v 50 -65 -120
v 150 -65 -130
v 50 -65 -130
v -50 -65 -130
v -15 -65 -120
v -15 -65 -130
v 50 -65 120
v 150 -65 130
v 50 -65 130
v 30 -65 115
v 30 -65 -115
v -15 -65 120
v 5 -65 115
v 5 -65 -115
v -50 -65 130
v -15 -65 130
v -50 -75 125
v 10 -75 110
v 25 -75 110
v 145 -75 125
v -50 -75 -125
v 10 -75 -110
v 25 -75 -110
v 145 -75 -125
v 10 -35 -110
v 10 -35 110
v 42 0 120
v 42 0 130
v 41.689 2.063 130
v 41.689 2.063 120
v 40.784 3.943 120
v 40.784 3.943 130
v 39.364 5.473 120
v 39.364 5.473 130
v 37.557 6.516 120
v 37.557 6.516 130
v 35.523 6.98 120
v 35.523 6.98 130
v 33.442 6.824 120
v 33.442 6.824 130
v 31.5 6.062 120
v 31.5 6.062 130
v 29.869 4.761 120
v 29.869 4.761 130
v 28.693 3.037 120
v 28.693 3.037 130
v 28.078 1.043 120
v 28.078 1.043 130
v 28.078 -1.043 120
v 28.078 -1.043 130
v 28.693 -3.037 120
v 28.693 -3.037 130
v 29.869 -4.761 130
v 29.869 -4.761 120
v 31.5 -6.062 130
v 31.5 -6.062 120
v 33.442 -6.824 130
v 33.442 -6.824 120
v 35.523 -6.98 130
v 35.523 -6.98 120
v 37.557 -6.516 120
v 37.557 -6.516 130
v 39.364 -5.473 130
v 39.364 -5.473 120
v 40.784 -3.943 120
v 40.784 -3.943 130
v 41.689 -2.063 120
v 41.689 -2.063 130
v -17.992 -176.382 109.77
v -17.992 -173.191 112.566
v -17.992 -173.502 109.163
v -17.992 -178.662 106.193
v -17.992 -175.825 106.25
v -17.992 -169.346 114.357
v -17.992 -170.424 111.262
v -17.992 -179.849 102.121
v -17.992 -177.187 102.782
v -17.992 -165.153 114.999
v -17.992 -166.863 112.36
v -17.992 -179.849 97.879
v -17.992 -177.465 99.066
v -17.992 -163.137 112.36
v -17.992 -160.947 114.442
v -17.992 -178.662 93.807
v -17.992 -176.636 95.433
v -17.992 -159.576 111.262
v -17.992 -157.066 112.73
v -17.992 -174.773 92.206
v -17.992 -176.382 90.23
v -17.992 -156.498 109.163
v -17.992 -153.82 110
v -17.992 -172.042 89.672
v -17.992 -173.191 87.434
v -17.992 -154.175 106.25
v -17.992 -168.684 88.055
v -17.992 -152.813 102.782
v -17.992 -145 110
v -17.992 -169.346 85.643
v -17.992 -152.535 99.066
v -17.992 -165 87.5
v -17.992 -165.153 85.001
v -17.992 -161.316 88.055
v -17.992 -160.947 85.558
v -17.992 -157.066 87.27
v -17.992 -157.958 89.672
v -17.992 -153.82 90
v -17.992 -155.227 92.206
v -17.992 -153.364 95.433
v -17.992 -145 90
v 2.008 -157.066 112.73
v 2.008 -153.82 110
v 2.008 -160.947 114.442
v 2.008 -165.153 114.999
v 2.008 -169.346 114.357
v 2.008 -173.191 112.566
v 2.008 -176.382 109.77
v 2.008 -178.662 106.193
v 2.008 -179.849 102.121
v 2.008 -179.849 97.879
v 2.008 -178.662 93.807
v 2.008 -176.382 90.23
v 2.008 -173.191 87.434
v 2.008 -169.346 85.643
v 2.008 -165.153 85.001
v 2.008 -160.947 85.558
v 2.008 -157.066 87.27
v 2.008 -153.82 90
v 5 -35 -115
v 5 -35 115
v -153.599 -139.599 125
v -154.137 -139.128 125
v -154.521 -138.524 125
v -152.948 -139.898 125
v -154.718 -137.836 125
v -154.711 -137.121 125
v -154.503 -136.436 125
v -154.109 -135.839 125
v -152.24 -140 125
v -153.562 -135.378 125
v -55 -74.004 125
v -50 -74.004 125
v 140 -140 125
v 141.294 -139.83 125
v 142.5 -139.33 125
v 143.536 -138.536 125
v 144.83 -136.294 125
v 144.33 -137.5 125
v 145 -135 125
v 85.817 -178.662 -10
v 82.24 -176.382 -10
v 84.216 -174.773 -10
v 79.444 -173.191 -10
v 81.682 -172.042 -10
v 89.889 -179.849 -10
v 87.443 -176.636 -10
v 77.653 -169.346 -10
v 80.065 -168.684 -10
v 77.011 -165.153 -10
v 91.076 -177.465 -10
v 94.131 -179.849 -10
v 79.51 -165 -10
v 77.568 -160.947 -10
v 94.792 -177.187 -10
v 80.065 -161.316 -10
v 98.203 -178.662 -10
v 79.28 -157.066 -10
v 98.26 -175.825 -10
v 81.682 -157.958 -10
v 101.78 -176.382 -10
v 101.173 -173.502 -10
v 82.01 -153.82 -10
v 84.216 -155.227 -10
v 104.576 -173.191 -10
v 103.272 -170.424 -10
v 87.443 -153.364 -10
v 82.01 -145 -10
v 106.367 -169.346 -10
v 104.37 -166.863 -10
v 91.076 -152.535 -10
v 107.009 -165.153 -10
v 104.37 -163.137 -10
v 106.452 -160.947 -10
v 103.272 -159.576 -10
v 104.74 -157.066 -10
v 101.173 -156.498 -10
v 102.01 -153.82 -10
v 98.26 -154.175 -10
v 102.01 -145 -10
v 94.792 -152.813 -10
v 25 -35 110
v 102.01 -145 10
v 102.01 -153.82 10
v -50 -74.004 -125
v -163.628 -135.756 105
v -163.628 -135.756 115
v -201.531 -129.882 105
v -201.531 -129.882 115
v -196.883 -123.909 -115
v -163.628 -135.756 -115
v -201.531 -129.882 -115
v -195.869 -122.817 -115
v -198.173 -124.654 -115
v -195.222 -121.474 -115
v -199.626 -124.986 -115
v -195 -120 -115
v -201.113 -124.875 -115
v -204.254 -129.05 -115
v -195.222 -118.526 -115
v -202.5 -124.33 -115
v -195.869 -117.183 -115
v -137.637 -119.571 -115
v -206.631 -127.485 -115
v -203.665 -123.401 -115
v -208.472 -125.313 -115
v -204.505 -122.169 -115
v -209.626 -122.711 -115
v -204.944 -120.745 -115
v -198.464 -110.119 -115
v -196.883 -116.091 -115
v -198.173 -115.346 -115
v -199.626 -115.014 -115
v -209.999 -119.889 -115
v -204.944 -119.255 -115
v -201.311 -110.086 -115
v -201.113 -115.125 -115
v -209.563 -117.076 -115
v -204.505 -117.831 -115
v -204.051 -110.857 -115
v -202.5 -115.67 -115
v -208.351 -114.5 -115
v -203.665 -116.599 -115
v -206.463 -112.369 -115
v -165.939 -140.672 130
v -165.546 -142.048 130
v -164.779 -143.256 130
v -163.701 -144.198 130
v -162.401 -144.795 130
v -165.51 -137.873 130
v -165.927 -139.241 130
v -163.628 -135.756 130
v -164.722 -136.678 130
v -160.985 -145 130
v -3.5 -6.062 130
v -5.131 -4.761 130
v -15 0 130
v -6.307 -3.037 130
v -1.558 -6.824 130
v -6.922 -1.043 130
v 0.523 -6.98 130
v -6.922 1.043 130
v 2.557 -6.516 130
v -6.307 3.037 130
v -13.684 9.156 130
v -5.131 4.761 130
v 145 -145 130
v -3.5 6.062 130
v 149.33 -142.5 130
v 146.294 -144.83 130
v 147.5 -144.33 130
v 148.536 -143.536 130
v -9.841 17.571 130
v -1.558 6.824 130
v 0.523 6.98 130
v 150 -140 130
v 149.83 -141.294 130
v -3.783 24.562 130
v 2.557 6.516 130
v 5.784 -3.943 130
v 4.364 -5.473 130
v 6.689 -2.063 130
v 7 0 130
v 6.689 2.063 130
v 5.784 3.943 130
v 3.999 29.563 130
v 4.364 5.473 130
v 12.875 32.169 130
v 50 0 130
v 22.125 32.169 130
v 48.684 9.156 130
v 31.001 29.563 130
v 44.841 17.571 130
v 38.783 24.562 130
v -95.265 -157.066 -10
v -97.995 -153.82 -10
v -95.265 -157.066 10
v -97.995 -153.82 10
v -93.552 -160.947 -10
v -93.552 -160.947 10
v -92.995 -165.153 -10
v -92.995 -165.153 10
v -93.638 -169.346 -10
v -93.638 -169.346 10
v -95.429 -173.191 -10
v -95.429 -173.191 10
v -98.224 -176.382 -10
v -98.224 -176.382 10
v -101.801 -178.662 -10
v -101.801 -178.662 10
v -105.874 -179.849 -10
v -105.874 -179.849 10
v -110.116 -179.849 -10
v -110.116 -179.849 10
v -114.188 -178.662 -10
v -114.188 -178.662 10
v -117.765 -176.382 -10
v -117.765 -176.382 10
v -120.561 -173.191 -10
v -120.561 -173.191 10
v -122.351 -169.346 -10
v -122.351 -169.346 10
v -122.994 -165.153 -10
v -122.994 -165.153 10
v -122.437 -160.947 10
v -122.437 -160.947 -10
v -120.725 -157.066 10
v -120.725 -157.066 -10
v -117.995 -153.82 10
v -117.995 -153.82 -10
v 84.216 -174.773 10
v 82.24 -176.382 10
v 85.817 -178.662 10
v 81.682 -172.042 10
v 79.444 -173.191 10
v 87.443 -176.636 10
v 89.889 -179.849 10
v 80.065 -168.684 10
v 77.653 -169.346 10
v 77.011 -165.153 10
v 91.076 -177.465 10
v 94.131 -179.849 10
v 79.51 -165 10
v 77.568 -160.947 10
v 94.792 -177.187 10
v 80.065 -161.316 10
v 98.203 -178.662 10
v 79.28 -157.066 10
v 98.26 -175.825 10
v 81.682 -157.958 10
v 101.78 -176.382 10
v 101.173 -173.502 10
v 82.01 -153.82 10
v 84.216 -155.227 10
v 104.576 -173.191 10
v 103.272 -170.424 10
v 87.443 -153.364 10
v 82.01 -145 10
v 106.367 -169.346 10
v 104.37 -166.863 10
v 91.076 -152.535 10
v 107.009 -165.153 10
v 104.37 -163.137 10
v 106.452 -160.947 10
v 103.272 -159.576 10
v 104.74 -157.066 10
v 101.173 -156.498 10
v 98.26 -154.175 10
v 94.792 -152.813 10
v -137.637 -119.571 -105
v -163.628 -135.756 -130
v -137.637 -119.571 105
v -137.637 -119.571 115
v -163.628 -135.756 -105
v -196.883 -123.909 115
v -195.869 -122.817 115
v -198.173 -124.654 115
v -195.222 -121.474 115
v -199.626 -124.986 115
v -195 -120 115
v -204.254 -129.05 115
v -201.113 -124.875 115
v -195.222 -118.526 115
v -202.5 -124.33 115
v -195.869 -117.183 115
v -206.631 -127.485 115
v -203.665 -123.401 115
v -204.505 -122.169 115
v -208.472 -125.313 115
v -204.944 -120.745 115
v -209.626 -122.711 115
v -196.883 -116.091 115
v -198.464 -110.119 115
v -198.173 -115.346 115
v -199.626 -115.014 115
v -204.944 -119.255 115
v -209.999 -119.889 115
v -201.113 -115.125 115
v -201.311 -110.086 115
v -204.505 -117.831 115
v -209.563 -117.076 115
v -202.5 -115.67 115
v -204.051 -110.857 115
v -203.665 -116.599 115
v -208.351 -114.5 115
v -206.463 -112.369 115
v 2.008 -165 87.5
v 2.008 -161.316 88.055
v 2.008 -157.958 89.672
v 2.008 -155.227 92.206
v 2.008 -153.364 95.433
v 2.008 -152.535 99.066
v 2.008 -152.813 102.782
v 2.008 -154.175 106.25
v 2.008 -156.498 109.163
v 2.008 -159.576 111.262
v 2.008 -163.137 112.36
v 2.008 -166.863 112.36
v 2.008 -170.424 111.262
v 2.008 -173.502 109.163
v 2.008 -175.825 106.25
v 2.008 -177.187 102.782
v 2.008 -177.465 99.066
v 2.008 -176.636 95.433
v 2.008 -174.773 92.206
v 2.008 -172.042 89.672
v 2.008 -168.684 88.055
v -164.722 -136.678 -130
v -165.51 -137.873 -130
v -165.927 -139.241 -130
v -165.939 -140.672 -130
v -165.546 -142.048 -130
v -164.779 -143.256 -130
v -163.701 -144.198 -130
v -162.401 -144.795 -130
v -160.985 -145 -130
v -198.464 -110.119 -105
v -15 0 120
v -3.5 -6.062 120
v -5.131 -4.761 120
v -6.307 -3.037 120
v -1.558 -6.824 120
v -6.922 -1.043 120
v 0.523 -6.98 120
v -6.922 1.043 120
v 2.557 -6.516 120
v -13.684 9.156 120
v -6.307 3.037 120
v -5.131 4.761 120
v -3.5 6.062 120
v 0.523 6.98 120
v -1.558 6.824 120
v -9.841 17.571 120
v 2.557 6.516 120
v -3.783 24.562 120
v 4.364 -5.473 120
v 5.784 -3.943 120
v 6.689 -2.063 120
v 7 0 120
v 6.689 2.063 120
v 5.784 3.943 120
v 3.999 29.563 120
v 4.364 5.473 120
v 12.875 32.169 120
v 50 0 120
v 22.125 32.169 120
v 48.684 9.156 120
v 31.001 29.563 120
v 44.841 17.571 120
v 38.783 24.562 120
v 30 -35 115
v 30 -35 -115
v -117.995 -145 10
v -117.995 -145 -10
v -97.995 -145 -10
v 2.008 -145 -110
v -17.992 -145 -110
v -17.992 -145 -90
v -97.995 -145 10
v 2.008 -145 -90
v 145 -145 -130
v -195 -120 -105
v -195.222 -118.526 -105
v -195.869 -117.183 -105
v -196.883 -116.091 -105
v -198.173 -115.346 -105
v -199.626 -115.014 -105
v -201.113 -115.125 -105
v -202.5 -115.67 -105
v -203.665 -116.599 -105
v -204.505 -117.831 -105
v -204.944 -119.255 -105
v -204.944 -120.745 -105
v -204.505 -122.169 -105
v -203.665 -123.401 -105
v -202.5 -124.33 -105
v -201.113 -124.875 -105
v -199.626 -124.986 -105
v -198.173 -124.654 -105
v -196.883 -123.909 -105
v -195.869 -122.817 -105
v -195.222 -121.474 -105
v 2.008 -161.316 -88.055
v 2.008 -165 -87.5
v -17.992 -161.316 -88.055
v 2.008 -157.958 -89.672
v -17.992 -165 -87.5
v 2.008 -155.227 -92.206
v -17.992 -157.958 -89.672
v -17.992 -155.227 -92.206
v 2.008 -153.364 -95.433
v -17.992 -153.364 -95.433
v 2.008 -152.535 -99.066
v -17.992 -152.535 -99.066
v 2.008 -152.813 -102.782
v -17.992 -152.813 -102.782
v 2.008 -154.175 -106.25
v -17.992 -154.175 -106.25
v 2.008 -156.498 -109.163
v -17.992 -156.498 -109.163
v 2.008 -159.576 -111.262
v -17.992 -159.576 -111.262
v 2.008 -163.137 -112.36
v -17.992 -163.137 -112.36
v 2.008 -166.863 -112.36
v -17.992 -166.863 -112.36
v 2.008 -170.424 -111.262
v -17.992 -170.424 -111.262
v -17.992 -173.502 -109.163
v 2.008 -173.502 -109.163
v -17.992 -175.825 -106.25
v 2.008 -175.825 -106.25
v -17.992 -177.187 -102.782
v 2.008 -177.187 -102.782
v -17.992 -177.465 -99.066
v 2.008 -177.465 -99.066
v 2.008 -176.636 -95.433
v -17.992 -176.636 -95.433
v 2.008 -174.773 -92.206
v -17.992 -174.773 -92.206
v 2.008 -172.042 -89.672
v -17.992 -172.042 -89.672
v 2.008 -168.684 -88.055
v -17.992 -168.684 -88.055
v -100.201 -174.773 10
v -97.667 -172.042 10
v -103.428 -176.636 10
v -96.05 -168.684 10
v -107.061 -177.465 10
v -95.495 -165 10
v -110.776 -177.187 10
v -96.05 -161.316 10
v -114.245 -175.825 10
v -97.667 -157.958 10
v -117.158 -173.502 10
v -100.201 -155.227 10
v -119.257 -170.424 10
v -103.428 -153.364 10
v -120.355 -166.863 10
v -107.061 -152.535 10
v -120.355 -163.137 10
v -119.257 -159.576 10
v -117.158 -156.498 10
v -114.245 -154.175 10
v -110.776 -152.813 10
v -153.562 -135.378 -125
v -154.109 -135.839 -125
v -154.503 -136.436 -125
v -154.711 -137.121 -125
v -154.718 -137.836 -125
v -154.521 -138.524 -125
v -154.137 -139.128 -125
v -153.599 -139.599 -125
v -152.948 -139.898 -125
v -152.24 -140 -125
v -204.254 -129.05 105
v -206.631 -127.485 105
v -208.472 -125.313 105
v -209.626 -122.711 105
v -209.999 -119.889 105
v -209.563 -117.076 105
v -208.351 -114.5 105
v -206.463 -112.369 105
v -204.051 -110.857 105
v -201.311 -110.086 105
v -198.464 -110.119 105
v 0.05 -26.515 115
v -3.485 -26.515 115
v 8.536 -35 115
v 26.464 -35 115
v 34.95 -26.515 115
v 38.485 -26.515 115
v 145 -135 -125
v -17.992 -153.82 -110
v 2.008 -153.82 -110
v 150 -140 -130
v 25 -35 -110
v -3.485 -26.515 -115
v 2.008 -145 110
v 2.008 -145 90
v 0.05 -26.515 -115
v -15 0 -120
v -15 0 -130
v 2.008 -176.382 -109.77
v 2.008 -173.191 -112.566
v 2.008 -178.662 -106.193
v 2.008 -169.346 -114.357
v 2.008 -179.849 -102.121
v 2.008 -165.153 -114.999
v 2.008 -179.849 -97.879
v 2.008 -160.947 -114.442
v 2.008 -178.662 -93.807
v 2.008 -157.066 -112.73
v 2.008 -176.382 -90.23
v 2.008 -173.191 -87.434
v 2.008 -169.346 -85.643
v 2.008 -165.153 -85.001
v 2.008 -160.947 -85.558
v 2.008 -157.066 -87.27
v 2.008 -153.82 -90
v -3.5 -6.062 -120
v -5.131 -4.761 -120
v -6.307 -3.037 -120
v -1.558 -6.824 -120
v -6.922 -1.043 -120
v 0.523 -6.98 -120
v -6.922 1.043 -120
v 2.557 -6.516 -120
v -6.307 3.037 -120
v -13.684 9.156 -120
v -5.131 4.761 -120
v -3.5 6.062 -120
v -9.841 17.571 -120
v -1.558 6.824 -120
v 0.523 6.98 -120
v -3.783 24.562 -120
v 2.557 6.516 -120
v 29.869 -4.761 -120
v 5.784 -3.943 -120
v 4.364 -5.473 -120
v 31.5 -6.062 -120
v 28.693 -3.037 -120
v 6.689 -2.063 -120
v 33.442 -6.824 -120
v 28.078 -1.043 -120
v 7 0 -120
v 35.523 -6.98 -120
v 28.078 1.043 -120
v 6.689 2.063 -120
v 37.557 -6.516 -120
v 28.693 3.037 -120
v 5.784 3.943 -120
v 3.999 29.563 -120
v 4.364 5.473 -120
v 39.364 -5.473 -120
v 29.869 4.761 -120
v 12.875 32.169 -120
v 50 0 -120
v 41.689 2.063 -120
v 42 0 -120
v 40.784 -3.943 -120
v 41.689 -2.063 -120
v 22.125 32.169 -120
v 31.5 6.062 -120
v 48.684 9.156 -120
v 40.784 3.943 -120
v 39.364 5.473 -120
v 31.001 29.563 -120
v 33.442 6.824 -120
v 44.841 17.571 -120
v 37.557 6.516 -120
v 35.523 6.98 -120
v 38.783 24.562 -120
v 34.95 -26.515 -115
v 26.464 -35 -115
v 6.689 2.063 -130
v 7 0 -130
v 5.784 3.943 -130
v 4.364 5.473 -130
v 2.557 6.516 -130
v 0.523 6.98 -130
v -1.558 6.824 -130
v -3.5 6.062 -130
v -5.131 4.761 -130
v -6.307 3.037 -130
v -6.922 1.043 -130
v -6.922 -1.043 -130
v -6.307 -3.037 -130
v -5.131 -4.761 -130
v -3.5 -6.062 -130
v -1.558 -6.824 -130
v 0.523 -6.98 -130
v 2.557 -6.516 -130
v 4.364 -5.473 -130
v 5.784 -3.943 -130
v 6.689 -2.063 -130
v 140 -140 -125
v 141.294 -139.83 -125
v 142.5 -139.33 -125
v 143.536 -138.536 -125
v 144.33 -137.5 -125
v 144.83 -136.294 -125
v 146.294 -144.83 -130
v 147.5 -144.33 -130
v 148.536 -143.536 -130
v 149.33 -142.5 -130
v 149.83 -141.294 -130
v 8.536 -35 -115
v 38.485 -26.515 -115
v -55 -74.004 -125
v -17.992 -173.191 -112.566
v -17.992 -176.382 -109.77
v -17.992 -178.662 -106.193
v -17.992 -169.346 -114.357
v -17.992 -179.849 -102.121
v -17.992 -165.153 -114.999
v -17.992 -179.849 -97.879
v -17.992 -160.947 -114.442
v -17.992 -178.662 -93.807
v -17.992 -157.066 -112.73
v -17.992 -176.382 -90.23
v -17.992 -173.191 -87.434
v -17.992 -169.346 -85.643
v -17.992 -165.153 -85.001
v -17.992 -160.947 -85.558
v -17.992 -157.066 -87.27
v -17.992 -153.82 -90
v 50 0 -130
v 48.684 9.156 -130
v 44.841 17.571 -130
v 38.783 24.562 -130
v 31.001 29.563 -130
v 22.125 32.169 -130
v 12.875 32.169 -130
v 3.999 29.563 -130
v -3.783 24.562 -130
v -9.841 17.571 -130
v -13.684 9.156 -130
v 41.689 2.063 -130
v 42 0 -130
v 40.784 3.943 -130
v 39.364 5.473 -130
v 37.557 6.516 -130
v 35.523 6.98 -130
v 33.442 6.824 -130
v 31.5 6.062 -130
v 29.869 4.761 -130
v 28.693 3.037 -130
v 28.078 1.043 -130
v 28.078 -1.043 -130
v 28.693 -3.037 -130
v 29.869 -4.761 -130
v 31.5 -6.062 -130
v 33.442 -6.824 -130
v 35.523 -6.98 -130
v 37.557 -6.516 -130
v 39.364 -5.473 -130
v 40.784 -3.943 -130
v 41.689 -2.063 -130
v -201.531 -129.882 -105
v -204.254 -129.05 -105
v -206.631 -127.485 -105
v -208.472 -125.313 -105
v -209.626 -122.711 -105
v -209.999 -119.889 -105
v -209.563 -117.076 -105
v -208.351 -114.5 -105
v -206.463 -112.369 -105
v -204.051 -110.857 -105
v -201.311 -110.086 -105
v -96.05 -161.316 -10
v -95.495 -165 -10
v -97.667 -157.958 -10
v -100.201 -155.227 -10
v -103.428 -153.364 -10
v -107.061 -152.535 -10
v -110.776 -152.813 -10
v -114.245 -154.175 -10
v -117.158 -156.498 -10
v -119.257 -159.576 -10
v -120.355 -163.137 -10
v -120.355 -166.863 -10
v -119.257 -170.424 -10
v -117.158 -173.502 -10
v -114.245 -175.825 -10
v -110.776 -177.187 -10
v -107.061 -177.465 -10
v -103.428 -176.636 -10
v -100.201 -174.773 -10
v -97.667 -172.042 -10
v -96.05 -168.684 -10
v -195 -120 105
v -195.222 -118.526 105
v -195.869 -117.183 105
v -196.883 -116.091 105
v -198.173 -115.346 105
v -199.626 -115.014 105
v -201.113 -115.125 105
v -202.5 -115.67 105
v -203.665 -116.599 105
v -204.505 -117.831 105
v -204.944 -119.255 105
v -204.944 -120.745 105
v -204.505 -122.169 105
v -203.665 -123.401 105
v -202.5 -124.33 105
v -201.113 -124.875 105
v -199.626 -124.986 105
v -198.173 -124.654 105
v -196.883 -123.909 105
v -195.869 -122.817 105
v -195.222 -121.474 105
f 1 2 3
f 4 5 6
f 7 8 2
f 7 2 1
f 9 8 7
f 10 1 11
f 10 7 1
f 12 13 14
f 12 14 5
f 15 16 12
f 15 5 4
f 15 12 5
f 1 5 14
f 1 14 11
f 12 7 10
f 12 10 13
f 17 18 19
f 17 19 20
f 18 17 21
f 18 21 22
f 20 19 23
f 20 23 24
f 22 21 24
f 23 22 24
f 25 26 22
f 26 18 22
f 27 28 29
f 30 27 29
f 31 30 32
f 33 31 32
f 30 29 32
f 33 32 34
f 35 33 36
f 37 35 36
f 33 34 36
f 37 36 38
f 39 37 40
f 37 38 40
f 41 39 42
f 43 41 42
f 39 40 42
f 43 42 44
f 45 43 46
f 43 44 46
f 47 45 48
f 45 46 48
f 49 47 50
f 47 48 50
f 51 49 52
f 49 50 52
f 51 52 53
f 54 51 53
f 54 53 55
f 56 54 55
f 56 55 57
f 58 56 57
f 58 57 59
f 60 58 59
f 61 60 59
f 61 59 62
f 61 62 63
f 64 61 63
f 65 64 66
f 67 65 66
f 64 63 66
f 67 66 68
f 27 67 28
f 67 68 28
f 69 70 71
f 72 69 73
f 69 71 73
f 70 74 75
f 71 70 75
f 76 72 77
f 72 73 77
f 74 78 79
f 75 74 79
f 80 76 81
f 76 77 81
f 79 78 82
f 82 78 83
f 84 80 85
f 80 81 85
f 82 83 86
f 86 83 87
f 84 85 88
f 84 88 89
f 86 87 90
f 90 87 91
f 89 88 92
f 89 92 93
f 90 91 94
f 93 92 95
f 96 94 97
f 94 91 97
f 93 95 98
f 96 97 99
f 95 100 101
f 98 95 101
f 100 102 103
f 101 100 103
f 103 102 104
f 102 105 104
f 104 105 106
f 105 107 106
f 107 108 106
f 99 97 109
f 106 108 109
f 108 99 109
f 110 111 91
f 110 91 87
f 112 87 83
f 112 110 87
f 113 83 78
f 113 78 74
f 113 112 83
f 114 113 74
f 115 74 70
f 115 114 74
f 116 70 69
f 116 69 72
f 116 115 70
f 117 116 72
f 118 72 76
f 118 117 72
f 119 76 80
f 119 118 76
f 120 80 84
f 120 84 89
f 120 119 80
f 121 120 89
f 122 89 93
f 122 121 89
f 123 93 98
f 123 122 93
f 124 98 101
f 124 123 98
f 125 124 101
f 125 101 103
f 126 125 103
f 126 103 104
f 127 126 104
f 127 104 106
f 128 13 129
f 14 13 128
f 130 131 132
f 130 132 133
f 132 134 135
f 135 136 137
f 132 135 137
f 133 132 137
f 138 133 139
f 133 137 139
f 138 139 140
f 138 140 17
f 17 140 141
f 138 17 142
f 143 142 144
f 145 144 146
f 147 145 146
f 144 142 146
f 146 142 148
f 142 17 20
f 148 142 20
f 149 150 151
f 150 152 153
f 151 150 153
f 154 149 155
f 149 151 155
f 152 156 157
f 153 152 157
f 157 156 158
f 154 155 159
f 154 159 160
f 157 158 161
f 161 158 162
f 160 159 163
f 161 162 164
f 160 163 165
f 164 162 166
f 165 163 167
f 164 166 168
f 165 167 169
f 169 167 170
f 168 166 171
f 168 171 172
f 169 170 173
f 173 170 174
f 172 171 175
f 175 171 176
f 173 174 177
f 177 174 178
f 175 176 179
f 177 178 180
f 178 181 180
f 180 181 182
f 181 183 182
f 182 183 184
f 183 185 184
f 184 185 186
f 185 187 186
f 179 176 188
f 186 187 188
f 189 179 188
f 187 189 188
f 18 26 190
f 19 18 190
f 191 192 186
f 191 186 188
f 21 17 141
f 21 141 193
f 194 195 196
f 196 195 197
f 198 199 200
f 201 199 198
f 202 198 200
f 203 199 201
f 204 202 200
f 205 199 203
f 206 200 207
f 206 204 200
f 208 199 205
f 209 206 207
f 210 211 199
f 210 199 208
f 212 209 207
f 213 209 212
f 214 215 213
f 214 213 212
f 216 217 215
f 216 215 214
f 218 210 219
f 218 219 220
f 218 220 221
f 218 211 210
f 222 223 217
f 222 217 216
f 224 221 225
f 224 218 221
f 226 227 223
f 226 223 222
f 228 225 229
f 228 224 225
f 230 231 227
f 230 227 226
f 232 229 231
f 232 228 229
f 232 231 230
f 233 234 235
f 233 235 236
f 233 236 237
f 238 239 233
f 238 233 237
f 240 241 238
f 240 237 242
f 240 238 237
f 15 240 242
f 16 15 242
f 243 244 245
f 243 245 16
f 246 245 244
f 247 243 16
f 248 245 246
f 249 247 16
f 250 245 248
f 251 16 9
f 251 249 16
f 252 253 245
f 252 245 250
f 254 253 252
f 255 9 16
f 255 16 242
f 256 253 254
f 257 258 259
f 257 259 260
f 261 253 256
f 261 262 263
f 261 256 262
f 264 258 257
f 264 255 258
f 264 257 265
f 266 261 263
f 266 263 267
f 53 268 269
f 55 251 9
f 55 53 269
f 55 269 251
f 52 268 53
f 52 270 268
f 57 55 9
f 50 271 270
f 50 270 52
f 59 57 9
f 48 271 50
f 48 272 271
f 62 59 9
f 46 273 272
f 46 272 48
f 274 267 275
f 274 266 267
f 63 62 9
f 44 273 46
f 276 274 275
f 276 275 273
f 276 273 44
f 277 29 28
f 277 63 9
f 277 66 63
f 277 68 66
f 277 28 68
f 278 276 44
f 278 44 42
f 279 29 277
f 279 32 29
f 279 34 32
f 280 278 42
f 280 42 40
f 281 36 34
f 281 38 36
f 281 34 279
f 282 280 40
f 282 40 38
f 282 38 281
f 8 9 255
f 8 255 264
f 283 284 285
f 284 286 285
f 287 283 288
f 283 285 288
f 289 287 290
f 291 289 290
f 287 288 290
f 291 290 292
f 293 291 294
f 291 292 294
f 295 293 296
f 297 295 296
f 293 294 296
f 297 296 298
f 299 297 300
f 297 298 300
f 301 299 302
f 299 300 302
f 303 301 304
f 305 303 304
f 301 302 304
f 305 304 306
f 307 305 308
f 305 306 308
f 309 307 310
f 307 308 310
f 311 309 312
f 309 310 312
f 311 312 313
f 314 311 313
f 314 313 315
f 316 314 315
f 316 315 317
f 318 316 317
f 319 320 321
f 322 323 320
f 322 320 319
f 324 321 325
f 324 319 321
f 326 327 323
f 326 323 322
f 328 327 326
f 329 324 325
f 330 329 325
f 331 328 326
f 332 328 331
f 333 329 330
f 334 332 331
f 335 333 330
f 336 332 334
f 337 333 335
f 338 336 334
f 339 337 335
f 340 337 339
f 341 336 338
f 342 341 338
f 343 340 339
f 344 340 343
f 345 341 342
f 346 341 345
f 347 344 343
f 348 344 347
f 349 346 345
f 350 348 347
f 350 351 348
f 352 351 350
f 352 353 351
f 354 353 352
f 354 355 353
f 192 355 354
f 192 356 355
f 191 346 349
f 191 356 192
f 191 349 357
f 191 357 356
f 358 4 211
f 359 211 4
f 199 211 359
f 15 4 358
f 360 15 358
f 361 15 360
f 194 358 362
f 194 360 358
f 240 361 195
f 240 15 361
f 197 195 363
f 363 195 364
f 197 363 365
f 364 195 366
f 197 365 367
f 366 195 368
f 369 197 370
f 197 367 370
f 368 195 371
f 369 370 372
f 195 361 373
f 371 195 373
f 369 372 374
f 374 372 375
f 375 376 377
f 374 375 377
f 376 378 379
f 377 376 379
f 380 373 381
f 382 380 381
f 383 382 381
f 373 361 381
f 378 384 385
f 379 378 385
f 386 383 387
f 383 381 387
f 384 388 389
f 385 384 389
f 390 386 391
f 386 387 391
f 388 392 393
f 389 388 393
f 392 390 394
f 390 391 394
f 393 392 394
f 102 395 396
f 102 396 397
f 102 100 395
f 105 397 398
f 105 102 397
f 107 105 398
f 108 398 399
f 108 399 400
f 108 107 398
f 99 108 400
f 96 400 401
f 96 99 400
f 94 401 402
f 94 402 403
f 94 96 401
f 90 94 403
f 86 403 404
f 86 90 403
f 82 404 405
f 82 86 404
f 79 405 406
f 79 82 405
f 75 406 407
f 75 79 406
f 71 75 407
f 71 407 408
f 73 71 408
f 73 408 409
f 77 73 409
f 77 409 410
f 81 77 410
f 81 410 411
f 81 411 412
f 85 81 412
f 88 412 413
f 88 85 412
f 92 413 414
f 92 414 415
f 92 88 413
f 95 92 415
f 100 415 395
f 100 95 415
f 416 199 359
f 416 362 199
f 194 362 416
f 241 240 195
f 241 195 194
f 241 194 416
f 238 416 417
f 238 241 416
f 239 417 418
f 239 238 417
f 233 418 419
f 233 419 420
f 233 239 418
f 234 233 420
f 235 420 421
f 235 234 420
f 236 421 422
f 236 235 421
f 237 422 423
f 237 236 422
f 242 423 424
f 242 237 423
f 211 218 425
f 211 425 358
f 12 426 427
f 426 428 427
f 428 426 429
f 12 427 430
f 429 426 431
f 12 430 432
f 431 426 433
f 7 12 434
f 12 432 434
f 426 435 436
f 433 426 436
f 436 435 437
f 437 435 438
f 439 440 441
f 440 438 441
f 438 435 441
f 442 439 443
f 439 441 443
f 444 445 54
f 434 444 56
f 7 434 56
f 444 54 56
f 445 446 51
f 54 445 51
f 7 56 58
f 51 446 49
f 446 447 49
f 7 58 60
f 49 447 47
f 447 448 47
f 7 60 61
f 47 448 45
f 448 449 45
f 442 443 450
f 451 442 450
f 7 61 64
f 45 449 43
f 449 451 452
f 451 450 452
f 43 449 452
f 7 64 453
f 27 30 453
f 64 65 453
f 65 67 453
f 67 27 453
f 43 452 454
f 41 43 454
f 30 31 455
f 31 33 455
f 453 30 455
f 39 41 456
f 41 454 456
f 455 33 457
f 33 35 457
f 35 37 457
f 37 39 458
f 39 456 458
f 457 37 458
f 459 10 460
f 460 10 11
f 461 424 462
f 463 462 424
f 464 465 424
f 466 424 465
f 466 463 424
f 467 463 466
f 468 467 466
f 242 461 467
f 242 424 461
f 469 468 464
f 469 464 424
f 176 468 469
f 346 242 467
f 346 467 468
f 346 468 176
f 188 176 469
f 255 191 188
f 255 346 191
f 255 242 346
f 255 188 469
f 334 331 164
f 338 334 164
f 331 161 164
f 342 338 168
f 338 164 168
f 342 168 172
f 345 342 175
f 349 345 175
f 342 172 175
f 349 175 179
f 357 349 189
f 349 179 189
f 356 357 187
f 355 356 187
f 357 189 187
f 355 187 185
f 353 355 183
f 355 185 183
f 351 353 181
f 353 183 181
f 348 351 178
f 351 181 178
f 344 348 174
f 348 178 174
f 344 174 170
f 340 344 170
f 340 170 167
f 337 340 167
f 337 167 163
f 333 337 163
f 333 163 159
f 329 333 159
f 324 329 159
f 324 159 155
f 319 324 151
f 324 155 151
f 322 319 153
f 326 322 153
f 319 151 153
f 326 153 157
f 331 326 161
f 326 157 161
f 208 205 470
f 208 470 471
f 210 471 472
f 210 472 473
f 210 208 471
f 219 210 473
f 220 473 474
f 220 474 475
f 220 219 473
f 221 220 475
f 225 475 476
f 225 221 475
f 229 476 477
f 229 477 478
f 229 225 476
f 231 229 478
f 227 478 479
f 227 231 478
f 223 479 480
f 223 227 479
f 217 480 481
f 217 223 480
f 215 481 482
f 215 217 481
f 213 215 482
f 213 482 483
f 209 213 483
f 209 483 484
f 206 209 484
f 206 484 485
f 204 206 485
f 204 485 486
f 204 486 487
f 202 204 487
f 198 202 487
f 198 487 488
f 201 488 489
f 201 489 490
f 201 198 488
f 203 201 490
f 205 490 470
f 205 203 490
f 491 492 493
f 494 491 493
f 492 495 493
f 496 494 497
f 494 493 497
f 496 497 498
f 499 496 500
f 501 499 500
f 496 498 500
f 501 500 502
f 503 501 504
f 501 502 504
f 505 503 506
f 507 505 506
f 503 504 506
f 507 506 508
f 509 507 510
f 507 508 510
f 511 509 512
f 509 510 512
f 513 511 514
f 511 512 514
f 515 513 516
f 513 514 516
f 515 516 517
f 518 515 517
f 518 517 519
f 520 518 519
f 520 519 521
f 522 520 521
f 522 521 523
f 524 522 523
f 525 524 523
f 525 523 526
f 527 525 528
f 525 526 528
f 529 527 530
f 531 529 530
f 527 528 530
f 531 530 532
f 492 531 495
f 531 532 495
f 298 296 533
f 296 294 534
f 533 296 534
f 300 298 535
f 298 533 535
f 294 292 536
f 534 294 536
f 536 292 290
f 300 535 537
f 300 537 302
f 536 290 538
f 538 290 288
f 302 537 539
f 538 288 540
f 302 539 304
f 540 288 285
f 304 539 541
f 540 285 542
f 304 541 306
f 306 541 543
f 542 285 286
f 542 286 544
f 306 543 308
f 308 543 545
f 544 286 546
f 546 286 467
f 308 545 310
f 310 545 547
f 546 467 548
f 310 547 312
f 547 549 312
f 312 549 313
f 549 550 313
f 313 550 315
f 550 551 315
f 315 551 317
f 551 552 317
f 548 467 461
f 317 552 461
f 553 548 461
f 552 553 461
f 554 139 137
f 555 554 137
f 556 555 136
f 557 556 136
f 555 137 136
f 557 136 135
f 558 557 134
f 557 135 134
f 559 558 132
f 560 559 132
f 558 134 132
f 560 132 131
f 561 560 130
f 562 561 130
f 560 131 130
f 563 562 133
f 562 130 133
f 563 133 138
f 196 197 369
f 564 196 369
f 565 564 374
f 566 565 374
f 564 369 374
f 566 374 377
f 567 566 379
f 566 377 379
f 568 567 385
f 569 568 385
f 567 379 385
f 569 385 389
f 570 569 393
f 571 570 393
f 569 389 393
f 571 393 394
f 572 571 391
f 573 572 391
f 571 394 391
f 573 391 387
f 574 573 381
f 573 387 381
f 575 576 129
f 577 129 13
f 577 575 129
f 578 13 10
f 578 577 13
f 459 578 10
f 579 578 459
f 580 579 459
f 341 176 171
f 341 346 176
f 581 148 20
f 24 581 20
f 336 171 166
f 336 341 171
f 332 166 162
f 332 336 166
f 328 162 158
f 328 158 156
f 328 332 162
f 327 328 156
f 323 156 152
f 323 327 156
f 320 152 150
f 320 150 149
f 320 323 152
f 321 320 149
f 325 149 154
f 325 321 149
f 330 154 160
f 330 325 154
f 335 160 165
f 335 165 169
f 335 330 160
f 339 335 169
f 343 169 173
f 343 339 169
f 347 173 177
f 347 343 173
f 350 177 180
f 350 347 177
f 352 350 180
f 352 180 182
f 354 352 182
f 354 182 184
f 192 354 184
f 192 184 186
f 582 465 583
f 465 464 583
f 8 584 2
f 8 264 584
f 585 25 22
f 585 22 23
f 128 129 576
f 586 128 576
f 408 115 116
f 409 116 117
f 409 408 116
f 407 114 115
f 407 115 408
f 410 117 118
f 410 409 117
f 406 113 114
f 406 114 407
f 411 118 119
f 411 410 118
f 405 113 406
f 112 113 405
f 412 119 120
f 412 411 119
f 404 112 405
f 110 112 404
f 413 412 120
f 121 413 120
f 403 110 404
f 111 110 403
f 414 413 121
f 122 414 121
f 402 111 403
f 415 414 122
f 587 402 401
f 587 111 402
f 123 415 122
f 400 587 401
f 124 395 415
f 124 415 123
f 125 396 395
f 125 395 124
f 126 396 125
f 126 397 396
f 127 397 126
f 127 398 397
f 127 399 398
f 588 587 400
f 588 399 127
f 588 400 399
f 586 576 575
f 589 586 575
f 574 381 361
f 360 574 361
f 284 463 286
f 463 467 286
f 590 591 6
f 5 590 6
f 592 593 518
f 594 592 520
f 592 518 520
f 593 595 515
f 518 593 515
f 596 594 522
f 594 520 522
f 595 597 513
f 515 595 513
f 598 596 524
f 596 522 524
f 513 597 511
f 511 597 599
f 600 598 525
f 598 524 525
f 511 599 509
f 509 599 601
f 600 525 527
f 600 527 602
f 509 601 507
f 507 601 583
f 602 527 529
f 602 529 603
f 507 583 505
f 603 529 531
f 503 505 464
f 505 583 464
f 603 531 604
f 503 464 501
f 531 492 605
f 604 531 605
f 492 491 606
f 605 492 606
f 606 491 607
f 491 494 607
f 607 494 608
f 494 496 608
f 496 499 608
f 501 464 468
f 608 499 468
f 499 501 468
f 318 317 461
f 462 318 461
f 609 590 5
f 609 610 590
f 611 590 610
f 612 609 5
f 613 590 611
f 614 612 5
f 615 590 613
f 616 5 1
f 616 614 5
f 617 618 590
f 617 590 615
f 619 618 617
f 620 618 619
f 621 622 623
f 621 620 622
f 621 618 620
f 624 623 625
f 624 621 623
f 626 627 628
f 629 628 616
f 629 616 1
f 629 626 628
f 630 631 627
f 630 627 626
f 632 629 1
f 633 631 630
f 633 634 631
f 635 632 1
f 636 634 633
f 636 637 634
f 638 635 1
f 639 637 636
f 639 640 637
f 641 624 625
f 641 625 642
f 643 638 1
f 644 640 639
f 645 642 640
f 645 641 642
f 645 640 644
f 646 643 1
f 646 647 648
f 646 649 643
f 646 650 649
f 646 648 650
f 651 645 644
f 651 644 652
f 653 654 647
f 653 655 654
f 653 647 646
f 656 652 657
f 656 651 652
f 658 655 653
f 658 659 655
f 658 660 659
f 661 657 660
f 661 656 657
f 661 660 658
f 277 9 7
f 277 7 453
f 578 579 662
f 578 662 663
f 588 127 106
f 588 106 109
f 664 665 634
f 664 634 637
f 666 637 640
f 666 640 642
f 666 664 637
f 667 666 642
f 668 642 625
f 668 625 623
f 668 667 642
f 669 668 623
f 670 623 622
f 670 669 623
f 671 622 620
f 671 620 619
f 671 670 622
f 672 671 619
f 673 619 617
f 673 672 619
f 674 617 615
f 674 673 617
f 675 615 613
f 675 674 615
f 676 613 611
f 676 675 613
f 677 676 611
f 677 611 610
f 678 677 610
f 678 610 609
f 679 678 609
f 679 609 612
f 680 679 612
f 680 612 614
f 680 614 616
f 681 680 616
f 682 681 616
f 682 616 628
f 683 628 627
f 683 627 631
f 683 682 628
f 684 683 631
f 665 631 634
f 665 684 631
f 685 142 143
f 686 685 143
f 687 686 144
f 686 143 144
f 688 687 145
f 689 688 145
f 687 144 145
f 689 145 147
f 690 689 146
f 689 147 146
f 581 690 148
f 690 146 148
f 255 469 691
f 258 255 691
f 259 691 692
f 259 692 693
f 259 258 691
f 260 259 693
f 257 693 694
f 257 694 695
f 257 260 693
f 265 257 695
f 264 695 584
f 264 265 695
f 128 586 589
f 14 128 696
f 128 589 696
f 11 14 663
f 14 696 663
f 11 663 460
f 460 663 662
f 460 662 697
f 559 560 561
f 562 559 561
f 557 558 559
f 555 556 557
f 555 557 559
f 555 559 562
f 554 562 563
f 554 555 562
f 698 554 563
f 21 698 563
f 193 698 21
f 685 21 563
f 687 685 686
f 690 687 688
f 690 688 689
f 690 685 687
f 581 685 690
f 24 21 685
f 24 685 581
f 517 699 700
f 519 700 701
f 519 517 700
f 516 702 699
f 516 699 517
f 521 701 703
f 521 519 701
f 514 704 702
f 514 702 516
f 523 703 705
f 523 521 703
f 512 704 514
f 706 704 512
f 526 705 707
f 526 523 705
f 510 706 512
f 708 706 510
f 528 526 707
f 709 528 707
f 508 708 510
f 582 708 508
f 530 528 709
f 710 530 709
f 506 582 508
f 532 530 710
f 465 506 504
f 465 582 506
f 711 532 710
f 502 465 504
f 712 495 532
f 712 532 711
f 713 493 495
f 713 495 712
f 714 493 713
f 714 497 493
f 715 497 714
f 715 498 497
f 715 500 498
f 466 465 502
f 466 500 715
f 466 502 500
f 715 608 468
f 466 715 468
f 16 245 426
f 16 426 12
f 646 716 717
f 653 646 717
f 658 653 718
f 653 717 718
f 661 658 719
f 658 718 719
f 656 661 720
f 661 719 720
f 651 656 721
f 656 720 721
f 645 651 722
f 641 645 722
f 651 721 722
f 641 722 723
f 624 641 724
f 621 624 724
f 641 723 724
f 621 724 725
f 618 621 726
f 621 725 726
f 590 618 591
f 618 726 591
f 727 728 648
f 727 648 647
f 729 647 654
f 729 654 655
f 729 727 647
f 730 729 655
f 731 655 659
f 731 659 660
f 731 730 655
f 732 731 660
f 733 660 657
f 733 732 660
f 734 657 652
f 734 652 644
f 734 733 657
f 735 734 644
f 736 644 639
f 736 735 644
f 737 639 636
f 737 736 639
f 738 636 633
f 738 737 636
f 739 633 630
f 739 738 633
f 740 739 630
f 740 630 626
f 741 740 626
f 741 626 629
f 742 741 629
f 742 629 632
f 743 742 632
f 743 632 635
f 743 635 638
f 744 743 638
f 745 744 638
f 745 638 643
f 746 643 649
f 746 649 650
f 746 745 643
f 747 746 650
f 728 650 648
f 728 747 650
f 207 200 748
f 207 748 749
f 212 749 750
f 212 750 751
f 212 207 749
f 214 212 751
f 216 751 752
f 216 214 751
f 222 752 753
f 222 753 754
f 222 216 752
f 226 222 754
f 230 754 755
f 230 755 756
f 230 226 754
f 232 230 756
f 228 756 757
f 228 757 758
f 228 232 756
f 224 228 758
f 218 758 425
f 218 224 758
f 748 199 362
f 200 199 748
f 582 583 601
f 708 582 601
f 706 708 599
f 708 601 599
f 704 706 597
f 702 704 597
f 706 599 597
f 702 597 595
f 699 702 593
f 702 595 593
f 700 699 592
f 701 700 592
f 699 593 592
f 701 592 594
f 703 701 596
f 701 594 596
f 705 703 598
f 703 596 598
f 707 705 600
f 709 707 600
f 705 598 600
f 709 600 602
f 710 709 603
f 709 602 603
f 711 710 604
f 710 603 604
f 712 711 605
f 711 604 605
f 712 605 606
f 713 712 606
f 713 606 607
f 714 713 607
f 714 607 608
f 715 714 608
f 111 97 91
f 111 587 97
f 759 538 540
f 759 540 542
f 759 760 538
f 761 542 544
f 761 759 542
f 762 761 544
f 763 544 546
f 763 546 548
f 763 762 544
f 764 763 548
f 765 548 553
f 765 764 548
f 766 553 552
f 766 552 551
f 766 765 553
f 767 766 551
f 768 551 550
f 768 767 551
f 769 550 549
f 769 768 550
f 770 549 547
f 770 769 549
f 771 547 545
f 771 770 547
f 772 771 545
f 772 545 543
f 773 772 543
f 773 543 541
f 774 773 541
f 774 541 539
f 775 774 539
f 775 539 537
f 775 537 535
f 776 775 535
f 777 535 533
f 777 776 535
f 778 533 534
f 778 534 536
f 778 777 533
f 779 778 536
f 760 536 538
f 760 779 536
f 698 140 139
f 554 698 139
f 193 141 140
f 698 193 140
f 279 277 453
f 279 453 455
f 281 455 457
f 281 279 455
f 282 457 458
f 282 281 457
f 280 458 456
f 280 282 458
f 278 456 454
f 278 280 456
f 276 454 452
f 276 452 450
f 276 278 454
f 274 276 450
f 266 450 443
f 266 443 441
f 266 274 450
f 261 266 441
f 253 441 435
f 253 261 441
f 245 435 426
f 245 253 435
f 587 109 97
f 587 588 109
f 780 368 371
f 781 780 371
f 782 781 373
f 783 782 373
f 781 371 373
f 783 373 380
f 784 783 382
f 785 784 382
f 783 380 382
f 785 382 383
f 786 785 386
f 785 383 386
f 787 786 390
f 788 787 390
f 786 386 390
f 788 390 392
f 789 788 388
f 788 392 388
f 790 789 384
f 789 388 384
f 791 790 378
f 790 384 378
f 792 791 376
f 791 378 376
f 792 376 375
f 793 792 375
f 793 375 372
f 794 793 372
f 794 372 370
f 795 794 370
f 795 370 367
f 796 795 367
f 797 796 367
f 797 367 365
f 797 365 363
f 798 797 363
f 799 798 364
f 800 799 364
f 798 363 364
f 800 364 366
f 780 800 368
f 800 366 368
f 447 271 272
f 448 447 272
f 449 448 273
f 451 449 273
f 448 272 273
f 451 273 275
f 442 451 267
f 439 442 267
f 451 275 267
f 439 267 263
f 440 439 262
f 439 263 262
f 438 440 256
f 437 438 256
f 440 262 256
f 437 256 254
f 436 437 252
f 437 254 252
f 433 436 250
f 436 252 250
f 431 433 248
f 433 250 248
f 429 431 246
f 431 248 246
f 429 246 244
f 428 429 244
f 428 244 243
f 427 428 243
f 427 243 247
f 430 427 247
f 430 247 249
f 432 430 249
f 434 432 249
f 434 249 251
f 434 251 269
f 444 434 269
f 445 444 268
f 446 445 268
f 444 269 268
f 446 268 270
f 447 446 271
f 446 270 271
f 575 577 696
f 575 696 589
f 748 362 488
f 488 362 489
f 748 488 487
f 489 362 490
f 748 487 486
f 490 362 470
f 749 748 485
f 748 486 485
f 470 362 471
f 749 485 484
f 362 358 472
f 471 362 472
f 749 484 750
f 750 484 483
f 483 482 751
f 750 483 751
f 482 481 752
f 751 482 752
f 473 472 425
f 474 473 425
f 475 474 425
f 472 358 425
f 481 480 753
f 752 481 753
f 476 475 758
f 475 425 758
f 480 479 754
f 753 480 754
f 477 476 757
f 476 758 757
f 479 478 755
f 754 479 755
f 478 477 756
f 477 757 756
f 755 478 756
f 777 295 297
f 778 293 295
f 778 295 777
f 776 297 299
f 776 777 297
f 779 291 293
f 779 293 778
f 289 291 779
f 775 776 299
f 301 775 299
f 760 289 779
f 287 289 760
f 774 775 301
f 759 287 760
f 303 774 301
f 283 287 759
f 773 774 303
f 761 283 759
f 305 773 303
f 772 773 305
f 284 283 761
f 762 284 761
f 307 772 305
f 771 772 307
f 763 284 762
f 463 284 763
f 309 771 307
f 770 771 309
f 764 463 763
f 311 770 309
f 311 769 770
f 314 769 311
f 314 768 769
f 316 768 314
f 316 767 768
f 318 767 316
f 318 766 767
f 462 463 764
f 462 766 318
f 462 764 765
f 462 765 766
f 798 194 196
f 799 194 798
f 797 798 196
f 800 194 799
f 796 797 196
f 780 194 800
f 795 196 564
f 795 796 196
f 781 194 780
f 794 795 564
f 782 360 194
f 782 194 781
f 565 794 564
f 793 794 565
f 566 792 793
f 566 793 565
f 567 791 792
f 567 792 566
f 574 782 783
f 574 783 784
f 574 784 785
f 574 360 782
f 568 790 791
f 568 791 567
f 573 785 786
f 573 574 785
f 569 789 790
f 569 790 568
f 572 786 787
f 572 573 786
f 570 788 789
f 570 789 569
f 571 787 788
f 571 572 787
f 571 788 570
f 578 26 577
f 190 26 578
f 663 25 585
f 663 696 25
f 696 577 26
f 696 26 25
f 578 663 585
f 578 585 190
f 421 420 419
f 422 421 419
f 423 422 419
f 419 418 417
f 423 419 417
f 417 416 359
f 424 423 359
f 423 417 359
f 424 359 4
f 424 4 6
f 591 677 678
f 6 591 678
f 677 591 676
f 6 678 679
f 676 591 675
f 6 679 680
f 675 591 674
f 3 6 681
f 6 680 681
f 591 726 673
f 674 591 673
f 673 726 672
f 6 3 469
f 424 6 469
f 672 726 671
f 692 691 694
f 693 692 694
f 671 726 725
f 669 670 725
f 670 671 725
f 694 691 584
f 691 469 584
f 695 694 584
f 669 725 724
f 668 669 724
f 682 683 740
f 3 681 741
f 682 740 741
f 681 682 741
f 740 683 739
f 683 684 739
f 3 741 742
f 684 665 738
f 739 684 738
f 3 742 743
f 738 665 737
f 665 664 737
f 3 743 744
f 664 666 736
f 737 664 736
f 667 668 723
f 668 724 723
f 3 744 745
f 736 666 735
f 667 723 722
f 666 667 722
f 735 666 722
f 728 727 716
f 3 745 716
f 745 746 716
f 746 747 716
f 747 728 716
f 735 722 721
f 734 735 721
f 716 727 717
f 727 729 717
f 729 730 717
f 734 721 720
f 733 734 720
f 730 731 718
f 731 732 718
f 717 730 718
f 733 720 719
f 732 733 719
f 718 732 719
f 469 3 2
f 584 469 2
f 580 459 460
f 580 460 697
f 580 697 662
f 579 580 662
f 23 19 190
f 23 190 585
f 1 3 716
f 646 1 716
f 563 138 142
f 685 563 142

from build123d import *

# Parameters (mm, degrees)
SKETCH5_W            = 200
SKETCH5_H            = 250
SKETCH5_W_2          = 15
SKETCH5_H_2          = 220
BOSS_EXTRUDE7_DEPTH  = 10
BOSS_EXTRUDE13_DEPTH = 250
BOSS_EXTRUDE14_DEPTH = 5
SKETCH8_W            = 25
SKETCH8_H            = 230
SKETCH8_W_2          = 15
SKETCH8_H_2          = 220
BOSS_EXTRUDE15_DEPTH = 30
BOSS_EXTRUDE16_DEPTH = 230
SKETCH11_R           = 7
BOSS_EXTRUDE17_DEPTH = 10
SKETCH12_R           = 5
BOSS_EXTRUDE18_DEPTH = 10
SKETCH14_R           = 12.5
BOSS_EXTRUDE20_DEPTH = 10
SKETCH18_R           = 12.5
BOSS_EXTRUDE21_DEPTH = 10


with BuildPart() as part:
    # Sketch5 → Boss-Extrude7 (new body)
    with BuildSketch(Plane(origin=(0, -75, 0), x_dir=(1, 0, 0), z_dir=(0, 1, 0))):
        with Locations((50, 0)):
            Rectangle(SKETCH5_W, SKETCH5_H)
        with Locations((17.5, 0)):
            Rectangle(SKETCH5_W_2, SKETCH5_H_2, mode=Mode.SUBTRACT)
    extrude(amount=BOSS_EXTRUDE7_DEPTH)



with BuildPart() as body_2:
    # Sketch6 → Boss-Extrude13 (new body)
    with BuildSketch(Plane.XY.offset(125)):
        with BuildLine():
            Line((150, -75), (150, -140))
            ThreePointArc((150, -140), (148.535533906, -143.535533906), (145, -145))
            Line((145, -145), (-160.984652809, -145))
            ThreePointArc((-160.984652809, -145), (-165.792037256, -141.374428892), (-163.627616041, -135.755621912))
            Line((-163.627616041, -135.755621912), (-50, -65))
            Line((-50, -65), (-50, -74.003631477))
            Line((-50, -74.003631477), (-55, -74.003631477))
            Line((-55, -74.003631477), (-153.561803461, -135.377810956))
            ThreePointArc((-153.561803461, -135.377810956), (-154.644014069, -138.187214446), (-152.240321845, -140))
            Line((-152.240321845, -140), (140, -140))
            ThreePointArc((140, -140), (143.535533906, -138.535533906), (145, -135))
            Line((145, -135), (145, -75))
            Line((145, -75), (150, -75))
        make_face()
    extrude(amount=-BOSS_EXTRUDE13_DEPTH)


with BuildPart() as part_1:
    add(part.part)

    add(body_2.part)  # Boss-Extrude14 merges body 2
    # Sketch7 → Boss-Extrude14 (add)
    with BuildSketch(Plane.XY.offset(125)):
        with BuildLine():
            Line((150, -65), (-50, -65))
            Line((-50, -65), (-163.627616041, -135.755621912))
            ThreePointArc((-163.627616041, -135.755621912), (-165.792037256, -141.374428892), (-160.984652809, -145))
            Line((-160.984652809, -145), (145, -145))
            ThreePointArc((145, -145), (148.535533906, -143.535533906), (150, -140))
            Line((150, -140), (150, -65))
        make_face()
    boss_extrude14 = extrude(amount=BOSS_EXTRUDE14_DEPTH)

    # Mirror1: Boss-Extrude14 across plane
    add(boss_extrude14.mirror(Plane.XY))

    # Sketch8 → Boss-Extrude15 (add)
    with BuildSketch(Plane(origin=(0, -65, 0), x_dir=(1, 0, 0), z_dir=(0, 1, 0))):
        with Locations((17.5, 0)):
            Rectangle(SKETCH8_W, SKETCH8_H)
        with Locations((17.5, 0)):
            Rectangle(SKETCH8_W_2, SKETCH8_H_2, mode=Mode.SUBTRACT)
    extrude(amount=BOSS_EXTRUDE15_DEPTH)

    # Sketch9 → Boss-Extrude16 (add)
    with BuildSketch(Plane.XY.offset(115)):
        Polygon((30, -35), (38.485281374, -26.514718626), (34.949747468, -26.514718626), (30, -31.464466094), (26.464466094, -35), align=None)
        Polygon((5, -35), (-3.485281374, -26.514718626), (0.050252532, -26.514718626), (5, -31.464466094), (8.535533906, -35), align=None)
    extrude(amount=-BOSS_EXTRUDE16_DEPTH)

    # Sketch11 → Boss-Extrude17 (add)
    with BuildSketch(Plane.XY.offset(130)):
        with BuildLine():
            Line((-15, -65), (50, -65))
            Line((50, -65), (50, 0))
            ThreePointArc((50, 0), (17.5, 32.5), (-15, 0))
            Line((-15, 0), (-15, -65))
        make_face()
        Circle(SKETCH11_R, mode=Mode.SUBTRACT)
        with Locations((35, 0)):
            Circle(SKETCH11_R, mode=Mode.SUBTRACT)
    boss_extrude17 = extrude(amount=-BOSS_EXTRUDE17_DEPTH)

    # Mirror2: Boss-Extrude17 across plane
    add(boss_extrude17.mirror(Plane.XY))

    # Sketch12 → Boss-Extrude18 (add)
    with BuildSketch(Plane.XY.offset(115)):
        with BuildLine():
            Line((-198.464399722, -110.118606789), (-137.637061185, -119.571370787))
            Line((-137.637061185, -119.571370787), (-163.627616041, -135.755621912))
            Line((-163.627616041, -135.755621912), (-201.531325193, -129.882056626))
            ThreePointArc((-201.531325193, -129.882056626), (-209.881725149, -118.466537228), (-198.464399722, -110.118606789))
        make_face()
        with Locations((-200, -120)):
            Circle(SKETCH12_R, mode=Mode.SUBTRACT)
    boss_extrude18 = extrude(amount=-BOSS_EXTRUDE18_DEPTH)

    # Mirror3: Boss-Extrude18 across plane
    add(boss_extrude18.mirror(Plane.XY))


with BuildPart() as body_2_2:
    # Sketch14 → Boss-Extrude20 (new, symmetric)
    with BuildSketch(Plane(origin=(-7.992326405, 0, 0), x_dir=(0, 0, -1), z_dir=(1, 0, 0))):
        with BuildLine():
            Line((-110, -145), (-110, -153.819660113))
            ThreePointArc((-110, -153.819660113), (-100, -180), (-90, -153.819660113))
            Line((-90, -153.819660113), (-90, -145))
            Line((-90, -145), (-110, -145))
        make_face()
        with Locations((-100, -165)):
            Circle(SKETCH14_R, mode=Mode.SUBTRACT)
    boss_extrude20 = extrude(amount=BOSS_EXTRUDE20_DEPTH, both=True)


with BuildPart() as part_2:
    add(part_1.part)

    # Mirror11: Boss-Extrude20 across plane
    add(boss_extrude20.mirror(Plane.XY))

    # Sketch18 → Boss-Extrude21 (add, symmetric)
    with BuildSketch(Plane.XY):
        with BuildLine():
            Line((-117.994652809, -145), (-97.994652809, -145))
            Line((-97.994652809, -145), (-97.994652809, -153.819660113))
            ThreePointArc((-97.994652809, -153.819660113), (-107.994652809, -180), (-117.994652809, -153.819660113))
            Line((-117.994652809, -153.819660113), (-117.994652809, -145))
        make_face()
        with Locations((-107.994652809, -165)):
            Circle(SKETCH18_R, mode=Mode.SUBTRACT)
    boss_extrude21 = extrude(amount=BOSS_EXTRUDE21_DEPTH, both=True)

    # Mirror15: Boss-Extrude21 across plane
    add(boss_extrude21.mirror(Plane(origin=(-7.992326405, 0, 0), x_dir=(0, 0, 1), z_dir=(1, 0, 0))))


solid = Compound([body_2_2.part, part_2.part])
